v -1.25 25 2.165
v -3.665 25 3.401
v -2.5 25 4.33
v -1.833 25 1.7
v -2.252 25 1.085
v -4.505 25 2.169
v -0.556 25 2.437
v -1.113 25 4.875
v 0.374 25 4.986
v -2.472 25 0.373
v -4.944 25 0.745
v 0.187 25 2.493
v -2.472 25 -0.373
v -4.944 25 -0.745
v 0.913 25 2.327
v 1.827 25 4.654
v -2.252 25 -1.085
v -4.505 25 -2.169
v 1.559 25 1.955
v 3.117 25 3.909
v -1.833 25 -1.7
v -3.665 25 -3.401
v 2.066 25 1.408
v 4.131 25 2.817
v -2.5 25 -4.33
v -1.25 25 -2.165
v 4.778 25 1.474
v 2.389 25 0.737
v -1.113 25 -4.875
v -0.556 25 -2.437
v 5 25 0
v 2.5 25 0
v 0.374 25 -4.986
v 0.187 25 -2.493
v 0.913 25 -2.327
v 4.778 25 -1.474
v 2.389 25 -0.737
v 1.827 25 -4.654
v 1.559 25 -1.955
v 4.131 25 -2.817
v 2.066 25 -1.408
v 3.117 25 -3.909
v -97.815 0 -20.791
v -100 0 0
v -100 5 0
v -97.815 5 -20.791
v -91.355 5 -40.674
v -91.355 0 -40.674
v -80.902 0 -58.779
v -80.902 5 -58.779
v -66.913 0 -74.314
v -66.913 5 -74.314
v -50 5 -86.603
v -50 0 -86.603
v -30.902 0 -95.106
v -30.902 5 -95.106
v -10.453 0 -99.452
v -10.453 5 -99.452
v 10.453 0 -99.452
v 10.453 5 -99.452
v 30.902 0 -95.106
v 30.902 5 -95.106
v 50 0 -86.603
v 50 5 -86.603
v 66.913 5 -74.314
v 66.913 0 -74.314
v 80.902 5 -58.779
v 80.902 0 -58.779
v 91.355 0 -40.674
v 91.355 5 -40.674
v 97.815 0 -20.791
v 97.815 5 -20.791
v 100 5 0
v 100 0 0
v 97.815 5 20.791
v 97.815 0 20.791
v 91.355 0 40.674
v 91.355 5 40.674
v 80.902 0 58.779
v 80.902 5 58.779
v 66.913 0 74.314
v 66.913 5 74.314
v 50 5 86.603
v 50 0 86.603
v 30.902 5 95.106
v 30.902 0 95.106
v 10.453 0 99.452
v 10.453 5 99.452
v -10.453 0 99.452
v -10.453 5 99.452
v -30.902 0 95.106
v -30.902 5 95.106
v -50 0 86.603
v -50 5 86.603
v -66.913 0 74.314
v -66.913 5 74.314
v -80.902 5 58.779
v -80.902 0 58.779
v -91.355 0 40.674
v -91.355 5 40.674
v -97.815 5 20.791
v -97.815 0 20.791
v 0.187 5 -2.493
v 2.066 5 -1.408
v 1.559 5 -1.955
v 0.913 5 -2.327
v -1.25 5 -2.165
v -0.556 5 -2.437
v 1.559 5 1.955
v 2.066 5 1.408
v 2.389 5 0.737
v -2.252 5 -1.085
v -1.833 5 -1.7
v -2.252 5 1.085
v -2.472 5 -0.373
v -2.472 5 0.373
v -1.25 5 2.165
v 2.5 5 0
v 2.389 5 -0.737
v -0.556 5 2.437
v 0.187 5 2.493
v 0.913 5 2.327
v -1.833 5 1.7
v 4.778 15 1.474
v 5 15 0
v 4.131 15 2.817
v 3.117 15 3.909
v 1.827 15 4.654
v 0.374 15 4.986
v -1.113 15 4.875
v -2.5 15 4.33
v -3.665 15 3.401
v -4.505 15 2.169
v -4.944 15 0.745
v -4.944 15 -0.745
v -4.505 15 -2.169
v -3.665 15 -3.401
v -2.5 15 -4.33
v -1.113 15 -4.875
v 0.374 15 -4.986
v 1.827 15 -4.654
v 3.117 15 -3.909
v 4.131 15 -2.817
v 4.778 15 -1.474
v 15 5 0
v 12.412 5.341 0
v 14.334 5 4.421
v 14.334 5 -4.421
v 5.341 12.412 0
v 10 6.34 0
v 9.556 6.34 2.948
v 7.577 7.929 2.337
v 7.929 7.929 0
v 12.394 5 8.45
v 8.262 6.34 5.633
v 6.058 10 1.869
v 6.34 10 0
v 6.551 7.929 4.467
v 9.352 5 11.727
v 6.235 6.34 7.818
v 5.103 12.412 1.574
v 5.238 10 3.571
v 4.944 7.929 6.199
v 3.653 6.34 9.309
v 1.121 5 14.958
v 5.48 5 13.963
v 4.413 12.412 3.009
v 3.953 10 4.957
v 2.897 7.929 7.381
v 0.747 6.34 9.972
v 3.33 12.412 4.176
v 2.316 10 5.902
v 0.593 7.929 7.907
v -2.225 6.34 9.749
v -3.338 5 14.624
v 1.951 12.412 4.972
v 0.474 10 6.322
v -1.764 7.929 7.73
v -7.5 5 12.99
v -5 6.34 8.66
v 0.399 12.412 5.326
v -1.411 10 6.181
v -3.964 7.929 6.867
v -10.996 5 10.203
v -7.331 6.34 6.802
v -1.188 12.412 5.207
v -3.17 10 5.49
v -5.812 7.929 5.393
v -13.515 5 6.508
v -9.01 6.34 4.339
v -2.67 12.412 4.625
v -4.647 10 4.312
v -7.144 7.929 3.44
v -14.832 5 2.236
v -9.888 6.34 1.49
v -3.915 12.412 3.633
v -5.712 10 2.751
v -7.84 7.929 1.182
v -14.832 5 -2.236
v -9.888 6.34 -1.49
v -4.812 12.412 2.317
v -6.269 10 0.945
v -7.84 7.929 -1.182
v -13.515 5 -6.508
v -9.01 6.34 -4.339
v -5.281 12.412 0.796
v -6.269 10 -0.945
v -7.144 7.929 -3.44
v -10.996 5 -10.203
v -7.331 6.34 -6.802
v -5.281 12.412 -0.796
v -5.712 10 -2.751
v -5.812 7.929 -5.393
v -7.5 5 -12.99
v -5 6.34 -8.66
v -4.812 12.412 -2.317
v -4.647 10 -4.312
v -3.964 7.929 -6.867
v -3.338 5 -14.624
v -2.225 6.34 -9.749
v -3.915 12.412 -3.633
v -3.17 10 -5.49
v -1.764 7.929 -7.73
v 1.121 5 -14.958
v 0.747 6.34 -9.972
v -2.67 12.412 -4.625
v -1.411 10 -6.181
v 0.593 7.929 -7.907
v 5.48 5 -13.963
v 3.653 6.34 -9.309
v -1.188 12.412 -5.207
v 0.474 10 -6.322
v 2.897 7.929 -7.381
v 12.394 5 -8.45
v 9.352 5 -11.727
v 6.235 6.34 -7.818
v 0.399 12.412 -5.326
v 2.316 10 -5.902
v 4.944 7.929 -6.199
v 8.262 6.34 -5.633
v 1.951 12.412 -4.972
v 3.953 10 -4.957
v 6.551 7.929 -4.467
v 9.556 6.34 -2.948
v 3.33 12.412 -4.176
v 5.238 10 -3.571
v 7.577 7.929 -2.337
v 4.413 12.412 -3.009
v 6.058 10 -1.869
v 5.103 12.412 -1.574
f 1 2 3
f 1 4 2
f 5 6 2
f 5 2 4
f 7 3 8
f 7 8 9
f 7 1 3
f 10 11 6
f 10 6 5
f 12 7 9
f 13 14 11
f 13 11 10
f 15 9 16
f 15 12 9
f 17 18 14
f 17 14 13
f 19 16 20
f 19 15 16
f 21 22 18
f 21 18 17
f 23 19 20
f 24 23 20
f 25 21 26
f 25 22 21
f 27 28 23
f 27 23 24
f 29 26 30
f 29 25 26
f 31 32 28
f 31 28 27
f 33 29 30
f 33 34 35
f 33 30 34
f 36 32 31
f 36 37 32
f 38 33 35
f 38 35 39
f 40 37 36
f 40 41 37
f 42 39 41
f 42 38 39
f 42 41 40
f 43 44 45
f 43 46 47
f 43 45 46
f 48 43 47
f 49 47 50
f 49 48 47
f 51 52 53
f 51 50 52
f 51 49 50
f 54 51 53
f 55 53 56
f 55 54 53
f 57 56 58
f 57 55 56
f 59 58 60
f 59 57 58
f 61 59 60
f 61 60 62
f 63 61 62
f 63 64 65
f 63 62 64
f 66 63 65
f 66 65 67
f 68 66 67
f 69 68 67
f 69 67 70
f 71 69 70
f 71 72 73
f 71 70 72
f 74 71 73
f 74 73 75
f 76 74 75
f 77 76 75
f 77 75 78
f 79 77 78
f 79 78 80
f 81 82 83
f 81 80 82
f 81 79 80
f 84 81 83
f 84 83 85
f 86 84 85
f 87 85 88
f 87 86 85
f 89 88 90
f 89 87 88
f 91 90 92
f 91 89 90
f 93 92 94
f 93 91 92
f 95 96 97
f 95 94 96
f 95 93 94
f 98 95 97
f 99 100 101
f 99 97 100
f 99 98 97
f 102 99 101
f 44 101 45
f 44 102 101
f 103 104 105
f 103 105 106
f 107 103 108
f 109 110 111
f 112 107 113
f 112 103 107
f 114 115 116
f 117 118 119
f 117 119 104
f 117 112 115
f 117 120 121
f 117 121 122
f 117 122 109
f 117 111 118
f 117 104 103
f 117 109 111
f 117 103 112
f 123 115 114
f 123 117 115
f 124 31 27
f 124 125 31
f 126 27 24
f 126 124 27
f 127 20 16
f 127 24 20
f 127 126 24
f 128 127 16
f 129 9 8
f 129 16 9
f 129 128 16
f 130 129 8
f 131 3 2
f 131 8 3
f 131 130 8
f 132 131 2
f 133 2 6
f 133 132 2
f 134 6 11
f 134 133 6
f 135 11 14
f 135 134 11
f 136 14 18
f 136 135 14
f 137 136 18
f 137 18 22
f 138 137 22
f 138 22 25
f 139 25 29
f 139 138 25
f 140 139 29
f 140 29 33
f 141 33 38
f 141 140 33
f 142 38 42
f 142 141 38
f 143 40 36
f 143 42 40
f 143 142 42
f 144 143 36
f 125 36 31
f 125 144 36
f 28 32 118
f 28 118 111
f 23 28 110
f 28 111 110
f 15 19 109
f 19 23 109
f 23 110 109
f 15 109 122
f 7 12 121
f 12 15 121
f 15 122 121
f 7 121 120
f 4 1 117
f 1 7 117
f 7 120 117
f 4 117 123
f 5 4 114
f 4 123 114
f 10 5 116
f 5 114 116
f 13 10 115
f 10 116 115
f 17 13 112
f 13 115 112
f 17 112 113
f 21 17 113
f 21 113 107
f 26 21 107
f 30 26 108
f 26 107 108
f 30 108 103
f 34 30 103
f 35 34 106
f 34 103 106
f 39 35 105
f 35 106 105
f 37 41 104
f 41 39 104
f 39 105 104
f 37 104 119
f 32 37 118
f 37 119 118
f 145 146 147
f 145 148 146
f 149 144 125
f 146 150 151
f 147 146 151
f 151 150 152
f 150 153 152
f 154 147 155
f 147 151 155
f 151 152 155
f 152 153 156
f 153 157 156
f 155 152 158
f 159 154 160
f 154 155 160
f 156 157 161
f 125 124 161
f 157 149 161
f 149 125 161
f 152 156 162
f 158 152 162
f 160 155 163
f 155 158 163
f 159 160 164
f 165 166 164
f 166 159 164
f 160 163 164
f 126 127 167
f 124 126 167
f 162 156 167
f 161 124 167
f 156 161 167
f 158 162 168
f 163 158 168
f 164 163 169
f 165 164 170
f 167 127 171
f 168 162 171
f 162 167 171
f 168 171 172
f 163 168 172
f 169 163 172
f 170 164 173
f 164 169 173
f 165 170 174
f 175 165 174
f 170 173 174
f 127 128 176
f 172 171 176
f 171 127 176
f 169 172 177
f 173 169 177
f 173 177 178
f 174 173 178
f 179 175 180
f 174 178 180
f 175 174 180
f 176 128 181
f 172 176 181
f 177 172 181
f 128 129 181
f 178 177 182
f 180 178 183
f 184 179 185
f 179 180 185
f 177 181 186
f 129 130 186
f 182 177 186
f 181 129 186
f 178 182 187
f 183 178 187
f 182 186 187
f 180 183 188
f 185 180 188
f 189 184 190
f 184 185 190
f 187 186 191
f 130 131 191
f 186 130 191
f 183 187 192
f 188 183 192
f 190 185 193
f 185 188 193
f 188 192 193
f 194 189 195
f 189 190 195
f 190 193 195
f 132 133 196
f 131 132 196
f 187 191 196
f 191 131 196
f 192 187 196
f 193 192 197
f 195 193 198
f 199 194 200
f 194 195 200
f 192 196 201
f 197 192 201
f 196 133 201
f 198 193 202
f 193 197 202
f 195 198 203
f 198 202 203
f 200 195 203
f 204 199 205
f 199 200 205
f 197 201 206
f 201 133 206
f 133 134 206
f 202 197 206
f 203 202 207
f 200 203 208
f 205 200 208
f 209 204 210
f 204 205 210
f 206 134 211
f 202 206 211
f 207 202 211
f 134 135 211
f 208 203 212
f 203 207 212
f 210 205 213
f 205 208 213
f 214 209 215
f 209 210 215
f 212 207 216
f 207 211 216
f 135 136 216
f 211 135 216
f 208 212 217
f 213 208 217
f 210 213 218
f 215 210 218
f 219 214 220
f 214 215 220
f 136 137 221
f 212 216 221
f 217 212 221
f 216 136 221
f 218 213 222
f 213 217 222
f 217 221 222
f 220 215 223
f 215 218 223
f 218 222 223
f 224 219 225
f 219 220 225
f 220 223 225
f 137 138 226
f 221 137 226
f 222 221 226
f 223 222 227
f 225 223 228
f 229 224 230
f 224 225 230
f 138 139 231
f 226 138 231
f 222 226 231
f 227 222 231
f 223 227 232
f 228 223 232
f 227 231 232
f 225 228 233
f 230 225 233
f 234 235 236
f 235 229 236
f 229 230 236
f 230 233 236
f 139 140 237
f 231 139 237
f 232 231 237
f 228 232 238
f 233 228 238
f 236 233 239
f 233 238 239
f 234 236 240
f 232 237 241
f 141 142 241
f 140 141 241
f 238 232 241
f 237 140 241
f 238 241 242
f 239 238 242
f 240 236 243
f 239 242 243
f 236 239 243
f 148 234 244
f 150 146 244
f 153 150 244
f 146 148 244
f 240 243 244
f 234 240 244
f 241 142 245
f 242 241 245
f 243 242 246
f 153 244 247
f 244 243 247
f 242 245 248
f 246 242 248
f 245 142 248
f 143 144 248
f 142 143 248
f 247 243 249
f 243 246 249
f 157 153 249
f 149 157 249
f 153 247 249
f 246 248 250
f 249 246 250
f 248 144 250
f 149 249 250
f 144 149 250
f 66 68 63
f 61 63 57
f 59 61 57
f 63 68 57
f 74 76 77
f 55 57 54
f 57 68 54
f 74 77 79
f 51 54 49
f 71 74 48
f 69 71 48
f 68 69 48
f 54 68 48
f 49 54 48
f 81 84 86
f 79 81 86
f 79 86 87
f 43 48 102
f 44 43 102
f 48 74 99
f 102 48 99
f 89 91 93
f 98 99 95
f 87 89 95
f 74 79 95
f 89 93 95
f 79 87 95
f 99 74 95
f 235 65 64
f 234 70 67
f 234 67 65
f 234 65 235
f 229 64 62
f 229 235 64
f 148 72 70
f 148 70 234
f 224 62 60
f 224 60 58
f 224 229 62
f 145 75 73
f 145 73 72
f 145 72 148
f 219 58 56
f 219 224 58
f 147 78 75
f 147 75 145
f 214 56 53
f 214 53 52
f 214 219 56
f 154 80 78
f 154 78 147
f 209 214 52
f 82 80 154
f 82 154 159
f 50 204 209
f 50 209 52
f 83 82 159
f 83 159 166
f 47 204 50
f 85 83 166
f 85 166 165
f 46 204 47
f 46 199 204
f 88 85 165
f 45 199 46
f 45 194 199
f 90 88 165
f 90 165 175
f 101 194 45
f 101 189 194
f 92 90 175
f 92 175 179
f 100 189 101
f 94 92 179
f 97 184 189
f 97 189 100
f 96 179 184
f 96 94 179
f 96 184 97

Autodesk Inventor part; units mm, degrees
ref_plane "YZ Plane" through (0, 0, 0) normal (1, 0, 0) x (0, 1, 0)
ref_plane "XZ Plane" through (0, 0, 0) normal (0, 1, 0) x (-1, 0, 0)
ref_plane "XY Plane" through (0, 0, 0) normal (0, 0, 1) x (1, 0, 0)
sketch "Sketch1" plane through (0, 0, 0) normal (0, 1, 0) x (-1, 0, 0)
  circle A0 centre (0, 0) radius 100
  dimension "d0" = 200
extrude "Extrusion1" add sketch "Sketch1" along normal blind 5
sketch "Sketch2" plane through (0, 5, 0) normal (0, 1, 0) x (1, 0, 0)
  circle A0 centre (0, 0) radius 2.5
  circle A1 centre (0, 0) radius 5
  dimension "d3" = 5
  dimension "d4" = 10
extrude "Extrusion2" add sketch "Sketch2" along normal blind 20
fillet "Fillet1" radius 10 1 edges at (-5, 5, 0)
properties part number "podlaga_za_vrtrenje"
